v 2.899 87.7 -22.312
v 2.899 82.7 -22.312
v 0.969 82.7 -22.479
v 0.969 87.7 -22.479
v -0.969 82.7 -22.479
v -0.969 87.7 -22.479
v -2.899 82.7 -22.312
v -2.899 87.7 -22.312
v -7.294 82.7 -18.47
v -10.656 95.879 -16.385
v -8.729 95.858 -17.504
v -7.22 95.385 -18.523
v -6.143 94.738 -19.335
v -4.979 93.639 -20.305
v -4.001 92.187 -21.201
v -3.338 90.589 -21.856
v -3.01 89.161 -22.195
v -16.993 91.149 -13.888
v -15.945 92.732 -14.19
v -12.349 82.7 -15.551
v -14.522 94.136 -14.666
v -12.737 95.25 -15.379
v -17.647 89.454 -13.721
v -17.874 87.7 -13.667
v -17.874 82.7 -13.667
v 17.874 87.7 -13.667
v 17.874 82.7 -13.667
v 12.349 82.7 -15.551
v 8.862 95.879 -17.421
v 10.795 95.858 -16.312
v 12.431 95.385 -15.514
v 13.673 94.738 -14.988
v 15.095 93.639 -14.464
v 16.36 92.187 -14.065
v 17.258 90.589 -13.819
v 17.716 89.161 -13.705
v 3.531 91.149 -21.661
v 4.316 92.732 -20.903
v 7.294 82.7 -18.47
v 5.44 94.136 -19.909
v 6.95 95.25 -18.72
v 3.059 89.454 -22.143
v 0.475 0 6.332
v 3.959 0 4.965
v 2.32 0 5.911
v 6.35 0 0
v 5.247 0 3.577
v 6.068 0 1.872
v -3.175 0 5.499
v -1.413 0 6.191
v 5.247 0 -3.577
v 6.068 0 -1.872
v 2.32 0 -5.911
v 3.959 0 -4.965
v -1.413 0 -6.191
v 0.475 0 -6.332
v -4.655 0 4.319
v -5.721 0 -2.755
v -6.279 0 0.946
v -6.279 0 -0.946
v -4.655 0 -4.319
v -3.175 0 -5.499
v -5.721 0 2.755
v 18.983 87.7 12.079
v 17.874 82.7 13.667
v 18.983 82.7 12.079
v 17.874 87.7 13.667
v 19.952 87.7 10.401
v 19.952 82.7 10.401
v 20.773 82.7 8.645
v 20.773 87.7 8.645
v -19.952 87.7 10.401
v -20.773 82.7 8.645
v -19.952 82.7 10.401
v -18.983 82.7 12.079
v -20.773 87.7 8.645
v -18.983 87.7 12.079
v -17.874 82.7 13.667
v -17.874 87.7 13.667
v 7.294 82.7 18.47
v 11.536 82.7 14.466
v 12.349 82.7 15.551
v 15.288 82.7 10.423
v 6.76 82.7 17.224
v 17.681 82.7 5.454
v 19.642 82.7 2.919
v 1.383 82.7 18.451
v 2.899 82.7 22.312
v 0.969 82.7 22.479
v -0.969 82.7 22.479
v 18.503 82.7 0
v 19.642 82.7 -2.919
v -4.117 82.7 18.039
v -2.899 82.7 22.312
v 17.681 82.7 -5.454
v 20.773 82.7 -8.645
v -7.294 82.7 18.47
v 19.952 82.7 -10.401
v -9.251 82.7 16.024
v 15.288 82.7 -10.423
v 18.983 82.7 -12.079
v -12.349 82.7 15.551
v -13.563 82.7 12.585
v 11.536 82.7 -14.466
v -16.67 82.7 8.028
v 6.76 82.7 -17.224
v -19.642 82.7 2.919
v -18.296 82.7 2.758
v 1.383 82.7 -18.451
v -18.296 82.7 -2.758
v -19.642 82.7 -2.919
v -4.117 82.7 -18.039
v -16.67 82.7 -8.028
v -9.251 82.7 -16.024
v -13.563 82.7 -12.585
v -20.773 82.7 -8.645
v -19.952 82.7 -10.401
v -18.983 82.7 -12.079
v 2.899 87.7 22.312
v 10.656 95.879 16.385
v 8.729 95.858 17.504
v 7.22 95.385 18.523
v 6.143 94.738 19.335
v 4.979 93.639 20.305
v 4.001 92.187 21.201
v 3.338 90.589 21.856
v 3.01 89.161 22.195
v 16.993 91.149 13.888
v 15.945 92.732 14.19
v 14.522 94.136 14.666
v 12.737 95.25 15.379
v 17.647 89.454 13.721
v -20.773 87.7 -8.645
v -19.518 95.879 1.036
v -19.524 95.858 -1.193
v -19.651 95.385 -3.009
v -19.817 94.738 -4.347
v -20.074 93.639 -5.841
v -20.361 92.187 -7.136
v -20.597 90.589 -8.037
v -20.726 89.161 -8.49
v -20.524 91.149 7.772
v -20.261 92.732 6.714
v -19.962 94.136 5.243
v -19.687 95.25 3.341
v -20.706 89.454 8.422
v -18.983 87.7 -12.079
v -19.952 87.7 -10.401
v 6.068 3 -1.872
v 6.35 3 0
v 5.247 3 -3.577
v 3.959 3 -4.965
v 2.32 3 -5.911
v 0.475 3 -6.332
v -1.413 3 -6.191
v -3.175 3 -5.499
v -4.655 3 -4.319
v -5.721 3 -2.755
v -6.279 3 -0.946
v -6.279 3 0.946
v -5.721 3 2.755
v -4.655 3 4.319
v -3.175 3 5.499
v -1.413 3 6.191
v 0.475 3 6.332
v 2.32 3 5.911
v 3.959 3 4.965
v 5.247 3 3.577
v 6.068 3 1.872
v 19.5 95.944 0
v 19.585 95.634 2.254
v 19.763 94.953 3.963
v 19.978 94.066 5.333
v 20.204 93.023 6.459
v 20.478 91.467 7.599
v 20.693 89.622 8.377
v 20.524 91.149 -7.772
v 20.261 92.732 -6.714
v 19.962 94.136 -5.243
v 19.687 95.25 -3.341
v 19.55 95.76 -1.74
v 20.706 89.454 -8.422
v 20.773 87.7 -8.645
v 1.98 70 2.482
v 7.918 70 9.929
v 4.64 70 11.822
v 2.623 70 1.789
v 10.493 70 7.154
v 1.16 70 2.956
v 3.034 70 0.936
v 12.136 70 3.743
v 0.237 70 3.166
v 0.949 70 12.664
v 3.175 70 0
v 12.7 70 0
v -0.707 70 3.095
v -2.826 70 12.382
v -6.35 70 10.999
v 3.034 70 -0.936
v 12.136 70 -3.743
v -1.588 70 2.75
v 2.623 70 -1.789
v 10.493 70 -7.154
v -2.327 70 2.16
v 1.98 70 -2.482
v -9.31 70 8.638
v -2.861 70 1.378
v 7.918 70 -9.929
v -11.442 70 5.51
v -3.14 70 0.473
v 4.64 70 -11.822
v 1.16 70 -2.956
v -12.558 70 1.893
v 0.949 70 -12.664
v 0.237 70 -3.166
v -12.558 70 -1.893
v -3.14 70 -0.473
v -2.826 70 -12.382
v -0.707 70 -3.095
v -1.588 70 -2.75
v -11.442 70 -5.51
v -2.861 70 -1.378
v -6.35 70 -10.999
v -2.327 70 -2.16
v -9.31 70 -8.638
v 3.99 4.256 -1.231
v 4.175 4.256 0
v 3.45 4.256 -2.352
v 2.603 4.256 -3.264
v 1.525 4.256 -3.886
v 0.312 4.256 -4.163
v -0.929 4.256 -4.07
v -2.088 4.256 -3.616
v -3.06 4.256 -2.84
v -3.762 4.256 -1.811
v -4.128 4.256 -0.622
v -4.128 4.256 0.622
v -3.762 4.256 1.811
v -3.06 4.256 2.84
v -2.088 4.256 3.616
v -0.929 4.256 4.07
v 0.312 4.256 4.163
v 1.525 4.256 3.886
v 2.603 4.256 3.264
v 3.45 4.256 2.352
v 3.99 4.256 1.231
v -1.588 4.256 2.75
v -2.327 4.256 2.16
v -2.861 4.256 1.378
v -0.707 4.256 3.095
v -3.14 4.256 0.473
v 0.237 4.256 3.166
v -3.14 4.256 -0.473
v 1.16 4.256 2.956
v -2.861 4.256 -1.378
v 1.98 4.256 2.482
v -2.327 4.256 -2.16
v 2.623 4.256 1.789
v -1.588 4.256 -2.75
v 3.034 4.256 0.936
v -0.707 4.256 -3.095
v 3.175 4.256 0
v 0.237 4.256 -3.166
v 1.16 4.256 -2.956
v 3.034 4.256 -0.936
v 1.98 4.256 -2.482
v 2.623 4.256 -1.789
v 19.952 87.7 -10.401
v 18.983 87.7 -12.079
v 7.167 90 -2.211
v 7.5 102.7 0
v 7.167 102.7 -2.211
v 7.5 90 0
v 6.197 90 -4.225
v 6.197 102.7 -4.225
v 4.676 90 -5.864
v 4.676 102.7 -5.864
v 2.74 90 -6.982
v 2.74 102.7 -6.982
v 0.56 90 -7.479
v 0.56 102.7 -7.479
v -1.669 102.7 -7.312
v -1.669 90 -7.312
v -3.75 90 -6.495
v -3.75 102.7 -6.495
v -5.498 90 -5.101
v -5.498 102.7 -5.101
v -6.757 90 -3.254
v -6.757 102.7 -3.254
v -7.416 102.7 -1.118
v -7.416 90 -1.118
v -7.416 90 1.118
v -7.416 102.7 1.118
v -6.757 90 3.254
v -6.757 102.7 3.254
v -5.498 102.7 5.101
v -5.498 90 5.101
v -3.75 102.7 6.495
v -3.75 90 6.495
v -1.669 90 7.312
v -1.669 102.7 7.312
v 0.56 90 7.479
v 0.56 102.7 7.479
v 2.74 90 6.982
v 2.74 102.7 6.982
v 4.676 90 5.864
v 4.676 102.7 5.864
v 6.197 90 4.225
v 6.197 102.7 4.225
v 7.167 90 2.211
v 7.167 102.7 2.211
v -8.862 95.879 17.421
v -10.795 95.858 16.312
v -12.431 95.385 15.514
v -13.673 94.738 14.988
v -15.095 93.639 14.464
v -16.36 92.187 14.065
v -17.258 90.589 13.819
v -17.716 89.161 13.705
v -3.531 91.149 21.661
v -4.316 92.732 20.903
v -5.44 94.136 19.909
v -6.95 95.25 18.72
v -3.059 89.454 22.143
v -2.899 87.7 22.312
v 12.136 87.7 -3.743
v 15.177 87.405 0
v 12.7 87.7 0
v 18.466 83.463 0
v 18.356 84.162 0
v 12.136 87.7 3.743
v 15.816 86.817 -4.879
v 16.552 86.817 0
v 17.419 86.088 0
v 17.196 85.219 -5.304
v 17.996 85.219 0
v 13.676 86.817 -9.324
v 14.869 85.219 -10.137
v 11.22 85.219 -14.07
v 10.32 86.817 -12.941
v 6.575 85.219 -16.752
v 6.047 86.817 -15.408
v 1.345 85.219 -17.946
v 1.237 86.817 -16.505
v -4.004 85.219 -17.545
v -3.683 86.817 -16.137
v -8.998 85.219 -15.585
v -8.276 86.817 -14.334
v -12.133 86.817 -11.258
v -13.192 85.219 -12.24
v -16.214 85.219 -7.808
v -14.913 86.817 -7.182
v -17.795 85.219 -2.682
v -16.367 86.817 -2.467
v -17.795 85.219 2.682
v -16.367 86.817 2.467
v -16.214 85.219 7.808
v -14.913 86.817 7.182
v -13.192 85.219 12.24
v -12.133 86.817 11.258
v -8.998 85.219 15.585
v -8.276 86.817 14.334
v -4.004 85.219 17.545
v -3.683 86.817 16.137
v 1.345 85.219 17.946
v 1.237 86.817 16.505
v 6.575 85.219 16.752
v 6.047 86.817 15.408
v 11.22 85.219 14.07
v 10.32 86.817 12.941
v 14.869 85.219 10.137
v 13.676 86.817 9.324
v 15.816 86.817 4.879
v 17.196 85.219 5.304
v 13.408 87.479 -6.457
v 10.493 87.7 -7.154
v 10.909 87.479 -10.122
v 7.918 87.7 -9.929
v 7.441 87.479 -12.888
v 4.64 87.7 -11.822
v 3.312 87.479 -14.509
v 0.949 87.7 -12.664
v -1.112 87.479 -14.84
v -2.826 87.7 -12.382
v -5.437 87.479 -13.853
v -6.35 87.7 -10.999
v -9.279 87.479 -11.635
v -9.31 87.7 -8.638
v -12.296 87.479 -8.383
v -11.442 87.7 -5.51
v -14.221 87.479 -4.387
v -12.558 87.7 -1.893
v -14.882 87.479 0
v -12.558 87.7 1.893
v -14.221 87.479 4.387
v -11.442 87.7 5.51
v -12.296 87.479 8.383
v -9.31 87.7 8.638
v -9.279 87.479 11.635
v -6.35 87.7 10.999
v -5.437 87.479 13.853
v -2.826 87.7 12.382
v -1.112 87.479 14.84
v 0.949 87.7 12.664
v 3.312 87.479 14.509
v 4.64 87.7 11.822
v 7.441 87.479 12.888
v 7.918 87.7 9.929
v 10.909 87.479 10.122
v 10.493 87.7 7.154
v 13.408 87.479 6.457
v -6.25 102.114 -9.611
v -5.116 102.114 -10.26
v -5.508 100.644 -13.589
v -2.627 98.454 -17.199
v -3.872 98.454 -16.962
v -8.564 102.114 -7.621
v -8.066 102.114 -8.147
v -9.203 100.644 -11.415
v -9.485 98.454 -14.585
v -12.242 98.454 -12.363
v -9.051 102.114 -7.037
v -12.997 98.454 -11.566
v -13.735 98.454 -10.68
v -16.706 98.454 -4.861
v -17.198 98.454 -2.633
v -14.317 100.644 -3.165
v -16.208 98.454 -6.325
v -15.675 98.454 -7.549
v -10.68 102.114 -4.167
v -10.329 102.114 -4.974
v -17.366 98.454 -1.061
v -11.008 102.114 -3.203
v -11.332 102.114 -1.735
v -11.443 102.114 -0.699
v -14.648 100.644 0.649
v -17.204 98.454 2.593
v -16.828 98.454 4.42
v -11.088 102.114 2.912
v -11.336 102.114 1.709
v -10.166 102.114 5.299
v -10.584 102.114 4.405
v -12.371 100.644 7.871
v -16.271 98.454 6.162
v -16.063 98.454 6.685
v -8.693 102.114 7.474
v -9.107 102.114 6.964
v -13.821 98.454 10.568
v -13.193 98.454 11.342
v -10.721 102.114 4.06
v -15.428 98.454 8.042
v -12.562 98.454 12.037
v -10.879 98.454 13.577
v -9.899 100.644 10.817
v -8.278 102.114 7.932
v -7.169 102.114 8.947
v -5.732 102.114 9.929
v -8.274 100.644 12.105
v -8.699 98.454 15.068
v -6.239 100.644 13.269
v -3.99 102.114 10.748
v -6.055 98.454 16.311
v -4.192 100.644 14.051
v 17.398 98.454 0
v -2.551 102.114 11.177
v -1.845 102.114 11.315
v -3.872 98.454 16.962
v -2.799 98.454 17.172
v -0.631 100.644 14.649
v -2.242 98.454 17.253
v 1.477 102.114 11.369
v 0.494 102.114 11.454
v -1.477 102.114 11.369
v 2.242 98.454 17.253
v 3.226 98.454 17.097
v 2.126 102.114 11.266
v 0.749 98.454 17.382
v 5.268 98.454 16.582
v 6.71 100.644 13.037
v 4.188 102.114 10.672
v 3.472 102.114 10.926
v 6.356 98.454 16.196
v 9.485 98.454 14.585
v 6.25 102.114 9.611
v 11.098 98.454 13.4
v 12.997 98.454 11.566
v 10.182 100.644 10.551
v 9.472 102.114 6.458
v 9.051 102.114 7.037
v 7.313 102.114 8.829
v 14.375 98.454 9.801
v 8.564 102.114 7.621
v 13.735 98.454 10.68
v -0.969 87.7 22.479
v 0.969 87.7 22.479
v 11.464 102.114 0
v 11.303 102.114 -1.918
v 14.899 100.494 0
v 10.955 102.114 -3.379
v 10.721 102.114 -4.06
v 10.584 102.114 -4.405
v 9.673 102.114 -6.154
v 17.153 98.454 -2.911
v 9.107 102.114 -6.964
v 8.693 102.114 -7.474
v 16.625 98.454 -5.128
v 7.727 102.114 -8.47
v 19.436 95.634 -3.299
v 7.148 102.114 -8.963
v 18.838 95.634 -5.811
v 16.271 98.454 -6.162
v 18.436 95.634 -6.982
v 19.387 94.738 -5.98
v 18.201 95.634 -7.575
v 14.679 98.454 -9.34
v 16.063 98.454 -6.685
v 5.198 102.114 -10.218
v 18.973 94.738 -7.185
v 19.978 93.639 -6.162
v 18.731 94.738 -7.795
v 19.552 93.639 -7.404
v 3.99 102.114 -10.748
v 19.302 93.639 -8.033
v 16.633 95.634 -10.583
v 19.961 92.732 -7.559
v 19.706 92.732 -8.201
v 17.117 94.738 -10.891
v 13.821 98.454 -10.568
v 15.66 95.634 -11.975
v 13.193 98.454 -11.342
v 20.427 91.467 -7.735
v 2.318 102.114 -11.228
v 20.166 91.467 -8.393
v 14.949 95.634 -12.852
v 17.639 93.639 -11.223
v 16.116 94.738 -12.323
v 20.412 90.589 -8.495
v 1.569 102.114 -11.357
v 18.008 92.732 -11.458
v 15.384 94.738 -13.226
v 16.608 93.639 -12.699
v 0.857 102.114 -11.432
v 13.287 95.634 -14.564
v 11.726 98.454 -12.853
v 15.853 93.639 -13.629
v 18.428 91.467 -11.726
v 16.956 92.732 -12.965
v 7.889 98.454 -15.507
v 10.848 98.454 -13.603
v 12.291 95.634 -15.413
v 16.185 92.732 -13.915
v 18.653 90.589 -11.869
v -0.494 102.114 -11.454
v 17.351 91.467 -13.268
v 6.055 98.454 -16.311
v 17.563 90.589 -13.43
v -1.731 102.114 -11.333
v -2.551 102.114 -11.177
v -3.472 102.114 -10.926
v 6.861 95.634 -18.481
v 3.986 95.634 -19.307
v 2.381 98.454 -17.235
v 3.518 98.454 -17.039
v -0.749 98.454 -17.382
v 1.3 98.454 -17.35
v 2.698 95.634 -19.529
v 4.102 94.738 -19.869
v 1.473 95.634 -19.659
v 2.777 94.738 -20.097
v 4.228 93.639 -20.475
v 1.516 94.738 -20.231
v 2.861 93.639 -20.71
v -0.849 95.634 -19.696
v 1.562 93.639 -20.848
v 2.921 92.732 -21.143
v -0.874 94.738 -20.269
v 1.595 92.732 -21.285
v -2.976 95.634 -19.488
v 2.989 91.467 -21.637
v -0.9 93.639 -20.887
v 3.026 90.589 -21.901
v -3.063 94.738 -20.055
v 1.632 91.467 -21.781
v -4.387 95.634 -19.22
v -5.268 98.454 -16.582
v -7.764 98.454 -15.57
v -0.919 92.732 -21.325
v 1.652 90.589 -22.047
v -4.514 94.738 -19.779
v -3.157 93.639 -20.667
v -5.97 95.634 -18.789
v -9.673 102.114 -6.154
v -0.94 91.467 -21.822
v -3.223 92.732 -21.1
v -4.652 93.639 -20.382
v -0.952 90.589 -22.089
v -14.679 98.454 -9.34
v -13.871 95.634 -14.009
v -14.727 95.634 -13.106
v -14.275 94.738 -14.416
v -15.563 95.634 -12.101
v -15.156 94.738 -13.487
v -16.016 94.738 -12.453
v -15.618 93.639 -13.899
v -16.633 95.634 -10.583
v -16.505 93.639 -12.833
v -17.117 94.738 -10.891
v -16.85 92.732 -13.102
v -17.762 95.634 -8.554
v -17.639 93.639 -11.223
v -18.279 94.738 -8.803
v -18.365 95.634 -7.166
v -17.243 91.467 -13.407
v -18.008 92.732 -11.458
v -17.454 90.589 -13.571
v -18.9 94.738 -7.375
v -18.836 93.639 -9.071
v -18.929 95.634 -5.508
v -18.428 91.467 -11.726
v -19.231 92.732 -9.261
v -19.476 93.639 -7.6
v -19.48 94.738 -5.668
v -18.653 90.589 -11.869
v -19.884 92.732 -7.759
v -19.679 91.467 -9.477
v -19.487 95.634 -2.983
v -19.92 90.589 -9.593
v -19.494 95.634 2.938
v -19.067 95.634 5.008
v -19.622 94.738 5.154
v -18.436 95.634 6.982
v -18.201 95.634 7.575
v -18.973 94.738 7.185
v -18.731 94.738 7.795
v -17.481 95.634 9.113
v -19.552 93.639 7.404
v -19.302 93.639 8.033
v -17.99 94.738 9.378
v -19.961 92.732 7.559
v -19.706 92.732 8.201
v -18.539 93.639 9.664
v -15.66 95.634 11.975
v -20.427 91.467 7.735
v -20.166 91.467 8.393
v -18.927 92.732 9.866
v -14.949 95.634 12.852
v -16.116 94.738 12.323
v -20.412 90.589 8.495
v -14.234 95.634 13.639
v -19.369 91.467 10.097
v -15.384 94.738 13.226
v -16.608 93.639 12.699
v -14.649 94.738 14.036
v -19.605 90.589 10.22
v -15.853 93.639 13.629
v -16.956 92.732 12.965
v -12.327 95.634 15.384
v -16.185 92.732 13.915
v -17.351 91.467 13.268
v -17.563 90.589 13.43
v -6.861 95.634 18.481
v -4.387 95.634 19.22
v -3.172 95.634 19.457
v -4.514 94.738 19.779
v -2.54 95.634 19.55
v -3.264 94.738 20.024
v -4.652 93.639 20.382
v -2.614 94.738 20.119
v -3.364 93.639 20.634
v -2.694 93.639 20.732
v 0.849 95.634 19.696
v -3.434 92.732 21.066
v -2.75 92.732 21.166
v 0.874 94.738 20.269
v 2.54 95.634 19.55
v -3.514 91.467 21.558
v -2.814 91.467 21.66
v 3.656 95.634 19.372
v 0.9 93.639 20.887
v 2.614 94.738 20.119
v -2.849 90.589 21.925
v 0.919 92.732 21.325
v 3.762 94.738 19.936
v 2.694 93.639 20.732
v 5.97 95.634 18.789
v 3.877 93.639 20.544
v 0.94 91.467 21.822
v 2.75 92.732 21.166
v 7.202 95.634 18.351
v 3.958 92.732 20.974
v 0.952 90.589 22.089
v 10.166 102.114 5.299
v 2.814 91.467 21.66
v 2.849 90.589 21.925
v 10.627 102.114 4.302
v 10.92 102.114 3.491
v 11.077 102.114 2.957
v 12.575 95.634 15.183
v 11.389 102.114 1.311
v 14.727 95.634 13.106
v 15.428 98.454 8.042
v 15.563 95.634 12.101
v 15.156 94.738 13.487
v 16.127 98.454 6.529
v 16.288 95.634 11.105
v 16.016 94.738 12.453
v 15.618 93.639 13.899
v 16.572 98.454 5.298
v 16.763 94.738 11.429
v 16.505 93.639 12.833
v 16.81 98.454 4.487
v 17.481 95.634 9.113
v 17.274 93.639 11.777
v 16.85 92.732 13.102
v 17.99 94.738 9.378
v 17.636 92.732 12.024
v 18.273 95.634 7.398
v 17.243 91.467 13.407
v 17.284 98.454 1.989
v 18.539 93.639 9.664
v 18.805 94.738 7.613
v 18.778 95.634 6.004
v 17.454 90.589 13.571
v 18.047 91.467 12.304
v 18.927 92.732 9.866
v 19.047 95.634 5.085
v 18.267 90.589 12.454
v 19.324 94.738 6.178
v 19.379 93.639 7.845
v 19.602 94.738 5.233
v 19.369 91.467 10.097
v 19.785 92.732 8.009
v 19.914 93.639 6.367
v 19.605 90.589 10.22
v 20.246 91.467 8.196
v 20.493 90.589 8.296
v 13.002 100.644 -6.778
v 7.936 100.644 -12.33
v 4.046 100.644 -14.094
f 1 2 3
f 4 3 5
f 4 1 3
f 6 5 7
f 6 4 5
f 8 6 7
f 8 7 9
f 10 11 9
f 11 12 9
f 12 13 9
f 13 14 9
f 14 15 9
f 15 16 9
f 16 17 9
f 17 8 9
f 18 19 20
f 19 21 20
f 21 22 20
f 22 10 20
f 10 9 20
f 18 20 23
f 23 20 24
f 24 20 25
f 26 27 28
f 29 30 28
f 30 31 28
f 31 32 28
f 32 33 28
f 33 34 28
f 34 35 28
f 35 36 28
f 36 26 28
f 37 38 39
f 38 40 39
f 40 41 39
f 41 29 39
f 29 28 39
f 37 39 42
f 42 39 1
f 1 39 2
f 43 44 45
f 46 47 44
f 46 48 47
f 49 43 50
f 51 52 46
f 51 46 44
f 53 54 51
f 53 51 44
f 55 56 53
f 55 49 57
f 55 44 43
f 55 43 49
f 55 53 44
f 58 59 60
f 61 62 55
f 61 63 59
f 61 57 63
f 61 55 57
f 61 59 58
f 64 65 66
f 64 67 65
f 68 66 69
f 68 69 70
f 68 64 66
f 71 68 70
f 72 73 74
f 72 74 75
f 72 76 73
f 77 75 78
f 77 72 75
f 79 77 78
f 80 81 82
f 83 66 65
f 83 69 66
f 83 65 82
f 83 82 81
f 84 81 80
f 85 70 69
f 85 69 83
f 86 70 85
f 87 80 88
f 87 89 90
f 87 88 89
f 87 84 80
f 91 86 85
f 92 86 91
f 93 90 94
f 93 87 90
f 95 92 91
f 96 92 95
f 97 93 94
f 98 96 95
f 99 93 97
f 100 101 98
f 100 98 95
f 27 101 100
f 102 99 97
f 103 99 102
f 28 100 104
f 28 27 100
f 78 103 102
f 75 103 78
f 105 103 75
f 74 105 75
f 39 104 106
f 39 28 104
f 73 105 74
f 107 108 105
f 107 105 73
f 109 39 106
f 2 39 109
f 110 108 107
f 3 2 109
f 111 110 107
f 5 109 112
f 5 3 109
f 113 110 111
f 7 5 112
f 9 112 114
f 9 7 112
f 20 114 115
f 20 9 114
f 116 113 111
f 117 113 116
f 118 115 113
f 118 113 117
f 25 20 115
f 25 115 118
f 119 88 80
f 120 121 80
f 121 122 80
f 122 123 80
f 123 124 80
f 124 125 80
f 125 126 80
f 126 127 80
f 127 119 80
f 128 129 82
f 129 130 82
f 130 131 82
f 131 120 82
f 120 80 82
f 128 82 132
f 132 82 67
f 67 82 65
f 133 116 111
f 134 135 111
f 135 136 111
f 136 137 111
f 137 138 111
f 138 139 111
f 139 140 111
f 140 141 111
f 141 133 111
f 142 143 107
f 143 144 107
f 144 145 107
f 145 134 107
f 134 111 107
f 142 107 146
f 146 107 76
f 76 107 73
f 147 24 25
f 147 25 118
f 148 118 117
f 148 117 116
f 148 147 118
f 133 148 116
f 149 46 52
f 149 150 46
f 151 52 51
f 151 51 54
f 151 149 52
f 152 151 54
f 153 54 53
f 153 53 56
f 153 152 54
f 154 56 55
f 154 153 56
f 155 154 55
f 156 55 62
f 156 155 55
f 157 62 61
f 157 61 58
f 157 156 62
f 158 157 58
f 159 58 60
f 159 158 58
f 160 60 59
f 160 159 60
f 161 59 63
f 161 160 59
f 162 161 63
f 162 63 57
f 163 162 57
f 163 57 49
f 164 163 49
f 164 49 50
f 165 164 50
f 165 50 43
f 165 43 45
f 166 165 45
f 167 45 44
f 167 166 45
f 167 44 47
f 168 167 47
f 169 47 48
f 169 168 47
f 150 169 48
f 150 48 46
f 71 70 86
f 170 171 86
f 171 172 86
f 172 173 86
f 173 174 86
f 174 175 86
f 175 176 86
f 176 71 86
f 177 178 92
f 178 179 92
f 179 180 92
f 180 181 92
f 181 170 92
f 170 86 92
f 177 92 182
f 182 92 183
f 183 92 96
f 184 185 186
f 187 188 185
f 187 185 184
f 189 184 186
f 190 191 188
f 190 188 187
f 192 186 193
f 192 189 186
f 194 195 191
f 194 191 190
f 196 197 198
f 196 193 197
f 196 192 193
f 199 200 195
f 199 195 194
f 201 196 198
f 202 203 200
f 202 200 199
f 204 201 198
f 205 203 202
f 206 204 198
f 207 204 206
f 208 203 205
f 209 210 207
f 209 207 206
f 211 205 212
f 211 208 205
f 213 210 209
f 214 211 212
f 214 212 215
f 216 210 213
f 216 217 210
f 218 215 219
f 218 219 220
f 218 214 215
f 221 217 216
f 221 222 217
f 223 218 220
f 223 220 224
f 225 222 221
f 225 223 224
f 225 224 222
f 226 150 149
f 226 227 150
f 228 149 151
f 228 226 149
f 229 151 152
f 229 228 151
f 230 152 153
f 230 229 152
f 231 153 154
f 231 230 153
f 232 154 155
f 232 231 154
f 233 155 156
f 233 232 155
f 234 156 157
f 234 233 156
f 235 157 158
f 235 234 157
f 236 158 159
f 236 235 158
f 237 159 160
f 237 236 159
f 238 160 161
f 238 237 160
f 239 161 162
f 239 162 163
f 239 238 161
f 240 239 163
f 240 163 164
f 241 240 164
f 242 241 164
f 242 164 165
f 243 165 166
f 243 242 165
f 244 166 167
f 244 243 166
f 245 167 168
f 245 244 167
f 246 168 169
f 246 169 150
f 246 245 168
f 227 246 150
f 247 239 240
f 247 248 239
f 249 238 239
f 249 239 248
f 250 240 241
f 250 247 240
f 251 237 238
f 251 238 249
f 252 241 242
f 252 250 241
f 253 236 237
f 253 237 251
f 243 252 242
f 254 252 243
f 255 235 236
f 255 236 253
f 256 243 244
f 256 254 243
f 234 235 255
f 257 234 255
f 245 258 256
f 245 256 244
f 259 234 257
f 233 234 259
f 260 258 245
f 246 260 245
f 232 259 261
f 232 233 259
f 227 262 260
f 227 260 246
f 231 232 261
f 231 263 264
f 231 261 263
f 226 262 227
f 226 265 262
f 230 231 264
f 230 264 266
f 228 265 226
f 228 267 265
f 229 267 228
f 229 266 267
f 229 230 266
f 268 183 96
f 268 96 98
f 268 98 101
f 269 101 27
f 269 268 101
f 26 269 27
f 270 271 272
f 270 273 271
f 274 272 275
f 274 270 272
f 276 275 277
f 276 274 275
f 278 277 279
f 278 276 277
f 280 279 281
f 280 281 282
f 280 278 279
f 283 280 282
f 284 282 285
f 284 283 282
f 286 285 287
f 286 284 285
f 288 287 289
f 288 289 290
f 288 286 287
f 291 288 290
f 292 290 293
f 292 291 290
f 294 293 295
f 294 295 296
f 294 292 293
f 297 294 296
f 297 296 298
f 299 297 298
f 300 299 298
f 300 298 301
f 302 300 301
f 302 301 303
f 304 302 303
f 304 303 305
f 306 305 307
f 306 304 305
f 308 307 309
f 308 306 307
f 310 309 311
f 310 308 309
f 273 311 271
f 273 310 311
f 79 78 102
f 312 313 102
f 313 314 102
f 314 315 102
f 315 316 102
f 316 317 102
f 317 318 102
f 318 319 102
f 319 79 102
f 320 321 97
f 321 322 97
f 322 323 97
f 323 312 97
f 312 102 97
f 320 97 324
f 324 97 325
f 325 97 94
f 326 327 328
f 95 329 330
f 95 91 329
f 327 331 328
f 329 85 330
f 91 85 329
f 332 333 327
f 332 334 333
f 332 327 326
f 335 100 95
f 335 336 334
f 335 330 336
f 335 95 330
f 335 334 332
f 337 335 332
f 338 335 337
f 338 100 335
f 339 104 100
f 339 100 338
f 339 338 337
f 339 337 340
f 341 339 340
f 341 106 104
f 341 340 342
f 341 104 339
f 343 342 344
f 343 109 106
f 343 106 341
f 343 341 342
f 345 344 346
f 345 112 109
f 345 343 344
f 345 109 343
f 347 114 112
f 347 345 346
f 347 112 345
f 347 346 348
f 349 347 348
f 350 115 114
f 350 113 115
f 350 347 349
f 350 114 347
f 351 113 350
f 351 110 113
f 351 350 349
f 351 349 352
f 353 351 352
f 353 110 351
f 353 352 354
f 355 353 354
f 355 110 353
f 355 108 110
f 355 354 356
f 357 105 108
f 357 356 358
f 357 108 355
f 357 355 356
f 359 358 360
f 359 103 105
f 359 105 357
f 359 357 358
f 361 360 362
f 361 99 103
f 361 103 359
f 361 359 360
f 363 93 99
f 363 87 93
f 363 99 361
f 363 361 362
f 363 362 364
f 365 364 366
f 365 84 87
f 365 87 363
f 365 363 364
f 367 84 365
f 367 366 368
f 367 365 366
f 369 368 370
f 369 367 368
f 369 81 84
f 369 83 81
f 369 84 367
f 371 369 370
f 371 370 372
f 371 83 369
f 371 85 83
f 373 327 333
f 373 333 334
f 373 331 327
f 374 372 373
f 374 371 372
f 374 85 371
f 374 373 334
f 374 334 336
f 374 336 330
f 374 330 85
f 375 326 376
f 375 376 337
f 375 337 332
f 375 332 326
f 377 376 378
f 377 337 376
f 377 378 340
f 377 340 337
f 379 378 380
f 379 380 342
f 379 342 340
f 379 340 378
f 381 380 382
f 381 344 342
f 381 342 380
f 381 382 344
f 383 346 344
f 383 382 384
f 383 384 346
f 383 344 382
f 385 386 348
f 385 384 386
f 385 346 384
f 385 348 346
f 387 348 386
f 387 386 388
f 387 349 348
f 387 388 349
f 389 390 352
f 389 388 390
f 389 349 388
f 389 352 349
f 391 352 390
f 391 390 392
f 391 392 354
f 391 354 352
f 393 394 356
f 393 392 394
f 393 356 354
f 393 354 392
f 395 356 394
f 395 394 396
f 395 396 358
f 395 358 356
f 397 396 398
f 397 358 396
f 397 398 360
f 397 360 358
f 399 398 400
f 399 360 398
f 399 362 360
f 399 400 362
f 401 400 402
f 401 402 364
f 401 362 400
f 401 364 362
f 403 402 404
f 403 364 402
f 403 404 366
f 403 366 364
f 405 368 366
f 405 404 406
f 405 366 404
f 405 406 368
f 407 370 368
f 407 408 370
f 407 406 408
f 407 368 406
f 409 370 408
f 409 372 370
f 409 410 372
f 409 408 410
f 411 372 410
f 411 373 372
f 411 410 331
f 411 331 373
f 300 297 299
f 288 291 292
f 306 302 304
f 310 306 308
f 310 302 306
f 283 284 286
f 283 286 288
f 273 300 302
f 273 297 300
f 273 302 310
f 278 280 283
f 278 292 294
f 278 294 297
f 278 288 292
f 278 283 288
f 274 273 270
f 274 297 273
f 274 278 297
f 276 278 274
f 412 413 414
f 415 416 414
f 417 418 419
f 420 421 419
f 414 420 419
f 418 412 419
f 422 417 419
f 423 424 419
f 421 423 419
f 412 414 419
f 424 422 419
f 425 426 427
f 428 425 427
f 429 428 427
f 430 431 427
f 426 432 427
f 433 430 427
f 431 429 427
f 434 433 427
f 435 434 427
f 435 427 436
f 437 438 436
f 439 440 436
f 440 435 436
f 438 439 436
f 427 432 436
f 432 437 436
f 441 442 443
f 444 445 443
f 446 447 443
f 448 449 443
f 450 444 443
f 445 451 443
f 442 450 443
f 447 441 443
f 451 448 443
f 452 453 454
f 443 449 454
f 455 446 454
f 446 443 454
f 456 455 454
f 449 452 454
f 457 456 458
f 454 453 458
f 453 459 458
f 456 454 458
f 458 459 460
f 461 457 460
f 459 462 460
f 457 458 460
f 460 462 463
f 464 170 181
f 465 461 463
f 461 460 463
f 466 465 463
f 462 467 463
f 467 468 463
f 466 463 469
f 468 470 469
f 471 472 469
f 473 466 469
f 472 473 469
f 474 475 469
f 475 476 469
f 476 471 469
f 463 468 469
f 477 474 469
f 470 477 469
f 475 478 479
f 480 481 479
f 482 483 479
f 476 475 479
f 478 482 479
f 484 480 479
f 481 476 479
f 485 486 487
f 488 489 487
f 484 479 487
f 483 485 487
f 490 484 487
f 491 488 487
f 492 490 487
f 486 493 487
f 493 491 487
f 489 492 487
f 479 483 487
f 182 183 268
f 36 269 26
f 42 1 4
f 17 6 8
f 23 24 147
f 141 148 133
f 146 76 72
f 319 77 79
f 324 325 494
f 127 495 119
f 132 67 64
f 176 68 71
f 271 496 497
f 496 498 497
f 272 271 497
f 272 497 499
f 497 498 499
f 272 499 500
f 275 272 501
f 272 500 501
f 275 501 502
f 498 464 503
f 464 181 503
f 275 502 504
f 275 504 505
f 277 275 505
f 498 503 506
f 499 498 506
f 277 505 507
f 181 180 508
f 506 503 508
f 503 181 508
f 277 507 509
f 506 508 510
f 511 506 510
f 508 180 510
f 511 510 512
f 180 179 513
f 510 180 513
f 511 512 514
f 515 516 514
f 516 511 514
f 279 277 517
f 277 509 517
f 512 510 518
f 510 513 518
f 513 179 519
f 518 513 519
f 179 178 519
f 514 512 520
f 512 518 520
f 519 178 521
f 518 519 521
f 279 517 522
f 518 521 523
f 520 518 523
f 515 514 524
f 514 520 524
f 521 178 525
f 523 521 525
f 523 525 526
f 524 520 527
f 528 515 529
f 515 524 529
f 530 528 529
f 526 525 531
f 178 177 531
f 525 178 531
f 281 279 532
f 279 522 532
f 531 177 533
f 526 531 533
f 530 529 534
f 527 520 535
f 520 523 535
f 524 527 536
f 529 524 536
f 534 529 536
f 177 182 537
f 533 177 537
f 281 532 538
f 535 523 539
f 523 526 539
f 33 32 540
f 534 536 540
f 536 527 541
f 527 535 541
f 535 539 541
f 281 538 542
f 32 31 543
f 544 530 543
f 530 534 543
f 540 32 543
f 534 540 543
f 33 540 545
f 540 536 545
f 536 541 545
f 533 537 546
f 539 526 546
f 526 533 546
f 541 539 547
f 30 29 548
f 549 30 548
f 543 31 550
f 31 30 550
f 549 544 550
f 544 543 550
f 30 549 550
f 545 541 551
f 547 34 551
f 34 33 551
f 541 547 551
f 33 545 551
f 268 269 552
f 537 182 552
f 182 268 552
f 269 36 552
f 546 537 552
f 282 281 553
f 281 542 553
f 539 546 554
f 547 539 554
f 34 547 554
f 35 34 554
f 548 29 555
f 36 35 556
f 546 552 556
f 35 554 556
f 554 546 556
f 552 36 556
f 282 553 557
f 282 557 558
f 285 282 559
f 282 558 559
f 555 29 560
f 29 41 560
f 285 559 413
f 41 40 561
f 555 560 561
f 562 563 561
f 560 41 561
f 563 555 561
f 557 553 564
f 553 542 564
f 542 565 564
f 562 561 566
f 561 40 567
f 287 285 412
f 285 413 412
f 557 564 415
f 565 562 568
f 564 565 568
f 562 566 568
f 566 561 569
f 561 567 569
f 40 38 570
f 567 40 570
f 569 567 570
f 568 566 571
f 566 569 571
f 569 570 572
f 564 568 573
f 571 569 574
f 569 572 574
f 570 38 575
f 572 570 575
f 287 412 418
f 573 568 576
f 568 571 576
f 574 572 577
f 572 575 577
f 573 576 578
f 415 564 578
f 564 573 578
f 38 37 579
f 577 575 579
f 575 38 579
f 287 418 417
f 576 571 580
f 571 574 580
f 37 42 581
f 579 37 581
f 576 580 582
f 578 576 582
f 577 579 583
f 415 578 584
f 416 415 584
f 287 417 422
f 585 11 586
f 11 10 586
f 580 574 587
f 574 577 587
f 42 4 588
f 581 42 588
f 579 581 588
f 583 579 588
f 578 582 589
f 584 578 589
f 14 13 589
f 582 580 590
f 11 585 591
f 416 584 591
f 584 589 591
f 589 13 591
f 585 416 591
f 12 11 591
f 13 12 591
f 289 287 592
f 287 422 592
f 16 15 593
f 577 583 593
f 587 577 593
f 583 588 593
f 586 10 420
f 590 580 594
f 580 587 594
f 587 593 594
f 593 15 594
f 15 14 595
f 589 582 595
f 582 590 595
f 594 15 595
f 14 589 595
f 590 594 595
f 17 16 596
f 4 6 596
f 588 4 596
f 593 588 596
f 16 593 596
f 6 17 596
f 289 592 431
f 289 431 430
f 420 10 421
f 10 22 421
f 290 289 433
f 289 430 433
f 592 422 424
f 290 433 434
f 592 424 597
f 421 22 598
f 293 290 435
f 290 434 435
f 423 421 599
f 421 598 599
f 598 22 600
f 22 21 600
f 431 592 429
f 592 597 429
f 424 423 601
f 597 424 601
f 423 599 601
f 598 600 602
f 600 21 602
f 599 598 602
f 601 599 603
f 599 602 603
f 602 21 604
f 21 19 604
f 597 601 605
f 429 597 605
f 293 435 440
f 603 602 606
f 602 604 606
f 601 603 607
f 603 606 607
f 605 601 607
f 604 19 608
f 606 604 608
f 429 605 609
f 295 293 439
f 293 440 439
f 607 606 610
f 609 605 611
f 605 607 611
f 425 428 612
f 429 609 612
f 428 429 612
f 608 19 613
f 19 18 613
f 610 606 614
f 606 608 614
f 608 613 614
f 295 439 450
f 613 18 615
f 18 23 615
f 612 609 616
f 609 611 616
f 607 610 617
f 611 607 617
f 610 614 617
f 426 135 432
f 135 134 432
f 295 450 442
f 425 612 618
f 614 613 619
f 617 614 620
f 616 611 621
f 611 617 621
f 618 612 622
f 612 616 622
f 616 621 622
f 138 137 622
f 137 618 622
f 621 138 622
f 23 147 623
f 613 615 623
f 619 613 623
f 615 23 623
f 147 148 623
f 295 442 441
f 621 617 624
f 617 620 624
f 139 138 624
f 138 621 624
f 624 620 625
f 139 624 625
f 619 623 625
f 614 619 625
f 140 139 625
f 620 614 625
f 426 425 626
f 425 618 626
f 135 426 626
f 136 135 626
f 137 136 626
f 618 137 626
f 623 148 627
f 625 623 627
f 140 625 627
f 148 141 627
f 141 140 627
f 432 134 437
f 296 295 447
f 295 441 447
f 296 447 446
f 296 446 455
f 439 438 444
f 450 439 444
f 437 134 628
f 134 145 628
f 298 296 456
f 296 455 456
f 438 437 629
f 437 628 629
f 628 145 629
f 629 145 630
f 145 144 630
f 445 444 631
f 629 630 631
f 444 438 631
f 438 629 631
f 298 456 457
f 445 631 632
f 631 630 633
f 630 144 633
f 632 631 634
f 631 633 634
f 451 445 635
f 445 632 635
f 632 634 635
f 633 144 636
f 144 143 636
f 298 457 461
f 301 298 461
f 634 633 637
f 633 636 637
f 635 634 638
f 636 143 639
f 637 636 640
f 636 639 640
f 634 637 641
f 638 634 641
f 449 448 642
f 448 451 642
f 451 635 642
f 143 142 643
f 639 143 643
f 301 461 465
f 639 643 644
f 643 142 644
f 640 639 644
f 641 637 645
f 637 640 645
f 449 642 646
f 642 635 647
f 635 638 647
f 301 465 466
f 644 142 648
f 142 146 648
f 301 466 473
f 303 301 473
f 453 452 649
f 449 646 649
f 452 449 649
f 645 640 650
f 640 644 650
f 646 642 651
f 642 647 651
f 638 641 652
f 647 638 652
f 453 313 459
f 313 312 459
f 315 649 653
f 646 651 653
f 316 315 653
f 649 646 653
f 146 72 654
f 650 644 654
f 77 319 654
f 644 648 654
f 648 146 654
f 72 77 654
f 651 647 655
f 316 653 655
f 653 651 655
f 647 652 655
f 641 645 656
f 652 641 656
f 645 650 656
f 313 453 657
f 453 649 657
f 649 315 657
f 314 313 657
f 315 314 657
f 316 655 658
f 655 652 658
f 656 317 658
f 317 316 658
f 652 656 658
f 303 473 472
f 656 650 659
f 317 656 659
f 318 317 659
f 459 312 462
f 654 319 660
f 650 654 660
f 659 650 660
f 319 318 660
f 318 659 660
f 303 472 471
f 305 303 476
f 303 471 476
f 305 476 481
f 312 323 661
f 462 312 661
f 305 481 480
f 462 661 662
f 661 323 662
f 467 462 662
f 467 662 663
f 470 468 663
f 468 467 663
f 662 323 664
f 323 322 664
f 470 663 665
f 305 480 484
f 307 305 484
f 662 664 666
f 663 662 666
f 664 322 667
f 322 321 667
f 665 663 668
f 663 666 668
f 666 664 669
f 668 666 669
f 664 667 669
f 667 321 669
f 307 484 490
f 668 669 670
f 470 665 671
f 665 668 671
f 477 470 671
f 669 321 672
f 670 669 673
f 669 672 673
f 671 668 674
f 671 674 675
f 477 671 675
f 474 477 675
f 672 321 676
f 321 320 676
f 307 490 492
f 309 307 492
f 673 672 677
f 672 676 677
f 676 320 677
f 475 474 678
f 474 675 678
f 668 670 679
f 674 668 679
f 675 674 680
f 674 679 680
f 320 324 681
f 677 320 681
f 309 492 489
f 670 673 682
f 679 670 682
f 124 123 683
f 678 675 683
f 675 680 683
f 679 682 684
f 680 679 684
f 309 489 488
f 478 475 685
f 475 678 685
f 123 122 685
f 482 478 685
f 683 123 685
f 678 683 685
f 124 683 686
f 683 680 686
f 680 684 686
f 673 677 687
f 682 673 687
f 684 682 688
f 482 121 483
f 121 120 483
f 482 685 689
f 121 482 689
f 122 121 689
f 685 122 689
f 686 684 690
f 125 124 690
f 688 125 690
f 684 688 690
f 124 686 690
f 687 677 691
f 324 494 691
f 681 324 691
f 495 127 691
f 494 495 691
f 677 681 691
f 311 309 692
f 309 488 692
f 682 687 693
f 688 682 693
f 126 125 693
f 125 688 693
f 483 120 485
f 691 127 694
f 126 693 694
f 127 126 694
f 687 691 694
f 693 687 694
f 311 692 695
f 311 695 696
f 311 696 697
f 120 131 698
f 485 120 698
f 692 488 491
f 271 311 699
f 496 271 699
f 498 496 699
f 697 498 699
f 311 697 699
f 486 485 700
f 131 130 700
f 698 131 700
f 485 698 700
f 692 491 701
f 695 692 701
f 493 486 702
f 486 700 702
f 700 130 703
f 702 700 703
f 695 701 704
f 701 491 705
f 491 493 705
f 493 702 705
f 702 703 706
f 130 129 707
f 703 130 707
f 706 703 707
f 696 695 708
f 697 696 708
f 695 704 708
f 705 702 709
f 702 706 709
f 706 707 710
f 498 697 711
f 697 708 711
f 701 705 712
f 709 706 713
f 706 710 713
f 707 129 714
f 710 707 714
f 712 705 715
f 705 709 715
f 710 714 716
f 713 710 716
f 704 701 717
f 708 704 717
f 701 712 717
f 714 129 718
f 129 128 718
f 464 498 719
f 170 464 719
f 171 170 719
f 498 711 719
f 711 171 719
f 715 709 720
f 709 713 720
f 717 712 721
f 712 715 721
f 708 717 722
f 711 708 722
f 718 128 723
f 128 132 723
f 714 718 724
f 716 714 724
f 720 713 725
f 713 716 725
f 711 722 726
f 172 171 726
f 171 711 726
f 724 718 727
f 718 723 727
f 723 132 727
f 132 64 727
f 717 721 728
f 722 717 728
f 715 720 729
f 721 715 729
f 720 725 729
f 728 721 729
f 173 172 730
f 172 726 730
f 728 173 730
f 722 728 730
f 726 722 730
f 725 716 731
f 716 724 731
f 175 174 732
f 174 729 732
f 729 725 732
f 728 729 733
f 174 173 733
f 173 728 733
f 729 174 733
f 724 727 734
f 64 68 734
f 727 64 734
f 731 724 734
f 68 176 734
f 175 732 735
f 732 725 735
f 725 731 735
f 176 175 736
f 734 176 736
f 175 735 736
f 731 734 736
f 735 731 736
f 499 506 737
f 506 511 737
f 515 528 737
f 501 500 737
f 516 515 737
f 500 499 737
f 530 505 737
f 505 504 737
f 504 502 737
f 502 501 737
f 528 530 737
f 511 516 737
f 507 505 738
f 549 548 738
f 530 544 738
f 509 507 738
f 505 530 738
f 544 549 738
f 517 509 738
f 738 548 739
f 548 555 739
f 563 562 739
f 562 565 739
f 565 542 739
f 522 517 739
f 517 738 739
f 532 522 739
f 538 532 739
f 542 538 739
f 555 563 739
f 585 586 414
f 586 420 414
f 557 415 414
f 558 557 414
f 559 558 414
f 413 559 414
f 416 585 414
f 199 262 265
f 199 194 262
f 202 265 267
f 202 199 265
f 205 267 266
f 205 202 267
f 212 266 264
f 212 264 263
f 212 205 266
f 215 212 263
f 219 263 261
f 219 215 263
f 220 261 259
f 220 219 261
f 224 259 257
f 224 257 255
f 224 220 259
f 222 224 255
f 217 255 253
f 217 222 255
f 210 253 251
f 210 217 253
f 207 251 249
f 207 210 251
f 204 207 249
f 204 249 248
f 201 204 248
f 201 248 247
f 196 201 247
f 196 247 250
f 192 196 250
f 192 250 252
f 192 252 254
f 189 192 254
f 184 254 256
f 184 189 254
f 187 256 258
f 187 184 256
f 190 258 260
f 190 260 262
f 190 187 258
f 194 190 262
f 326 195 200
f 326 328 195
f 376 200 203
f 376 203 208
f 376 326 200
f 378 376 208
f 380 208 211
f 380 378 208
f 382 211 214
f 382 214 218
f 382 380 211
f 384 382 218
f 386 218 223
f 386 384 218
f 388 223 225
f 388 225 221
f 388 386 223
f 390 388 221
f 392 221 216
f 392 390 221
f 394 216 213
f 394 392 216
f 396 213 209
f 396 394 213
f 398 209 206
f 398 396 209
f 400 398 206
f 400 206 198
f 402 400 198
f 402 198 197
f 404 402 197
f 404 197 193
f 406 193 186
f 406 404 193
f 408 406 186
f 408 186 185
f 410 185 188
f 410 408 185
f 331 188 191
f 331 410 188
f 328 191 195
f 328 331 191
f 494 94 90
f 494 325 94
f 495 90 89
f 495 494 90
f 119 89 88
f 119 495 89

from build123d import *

# Parameters (mm, degrees)
CORTAR_EXTRUIR1_DEPTH = 89.610326763


with BuildPart() as part:
    # Croquis2 → Revolución1 (revolve)
    with BuildSketch(Plane.XY):
        with BuildLine():
            Line((3.175, 70), (12.7, 70))
            Line((12.7, 70), (12.7, 87.7))
            add(Edge.make_bspline(
                [(12.7, 87.7), (18.502741551, 87.7), (18.502741551, 82.7)],
                knots=[0, 0, 0, 1, 1, 1], degree=2))
            Line((18.502741551, 82.7), (22.5, 82.7))
            Line((22.5, 82.7), (22.5, 87.7))
            add(Edge.make_bspline(
                [(7.5, 102.7), (13.042740157, 102.7), (19.451979538, 97.810764177), (22.5, 90.380625461), (22.5, 87.7)],
                knots=[0, 0, 0, 0, 0.655380699, 1, 1, 1, 1], degree=3))
            Line((7.5, 102.7), (7.5, 90))
            Line((7.5, 90), (0, 90))
            Line((0, 90), (0, 0))
            Line((0, 0), (6.35, 0))
            Line((6.35, 0), (6.35, 3))
            Line((6.35, 3), (4.175, 4.255736835))
            Line((4.175, 4.255736835), (3.175, 4.255736835))
            Line((3.175, 4.255736835), (3.175, 70))
        make_face()
    revolve(axis=Axis((0, 0, 0), (0, 1, 0)))

    # Croquis3 → Cortar-Extruir1 (cut, through all)
    with BuildSketch(Plane.XZ.offset(-82.7)):
        with BuildLine():
            ThreePointArc((20.772727273, 8.645449766), (19.5, 0), (20.772727273, -8.645449766))
            ThreePointArc((20.772727273, -8.645449766), (22.5, 0), (20.772727273, 8.645449766))
        make_face()
        with BuildLine():
            ThreePointArc((17.873542761, -13.666984641), (9.75, -16.887495374), (2.899184512, -22.312434407))
            ThreePointArc((2.899184512, -22.312434407), (11.25, -19.485571585), (17.873542761, -13.666984641))
        make_face()
        with BuildLine():
            ThreePointArc((-2.899184512, -22.312434407), (-9.75, -16.887495374), (-17.873542761, -13.666984641))
            ThreePointArc((-17.873542761, -13.666984641), (-11.25, -19.485571585), (-2.899184512, -22.312434407))
        make_face()
        with BuildLine():
            ThreePointArc((-20.772727273, -8.645449766), (-19.5, 0), (-20.772727273, 8.645449766))
            ThreePointArc((-20.772727273, 8.645449766), (-22.5, 0), (-20.772727273, -8.645449766))
        make_face()
        with BuildLine():
            ThreePointArc((-17.873542761, 13.666984641), (-9.75, 16.887495374), (-2.899184512, 22.312434407))
            ThreePointArc((-2.899184512, 22.312434407), (-11.25, 19.485571585), (-17.873542761, 13.666984641))
        make_face()
        with BuildLine():
            ThreePointArc((2.899184512, 22.312434407), (9.75, 16.887495374), (17.873542761, 13.666984641))
            ThreePointArc((17.873542761, 13.666984641), (11.25, 19.485571585), (2.899184512, 22.312434407))
        make_face()
    extrude(amount=-CORTAR_EXTRUIR1_DEPTH, mode=Mode.SUBTRACT)


solid = part.part
